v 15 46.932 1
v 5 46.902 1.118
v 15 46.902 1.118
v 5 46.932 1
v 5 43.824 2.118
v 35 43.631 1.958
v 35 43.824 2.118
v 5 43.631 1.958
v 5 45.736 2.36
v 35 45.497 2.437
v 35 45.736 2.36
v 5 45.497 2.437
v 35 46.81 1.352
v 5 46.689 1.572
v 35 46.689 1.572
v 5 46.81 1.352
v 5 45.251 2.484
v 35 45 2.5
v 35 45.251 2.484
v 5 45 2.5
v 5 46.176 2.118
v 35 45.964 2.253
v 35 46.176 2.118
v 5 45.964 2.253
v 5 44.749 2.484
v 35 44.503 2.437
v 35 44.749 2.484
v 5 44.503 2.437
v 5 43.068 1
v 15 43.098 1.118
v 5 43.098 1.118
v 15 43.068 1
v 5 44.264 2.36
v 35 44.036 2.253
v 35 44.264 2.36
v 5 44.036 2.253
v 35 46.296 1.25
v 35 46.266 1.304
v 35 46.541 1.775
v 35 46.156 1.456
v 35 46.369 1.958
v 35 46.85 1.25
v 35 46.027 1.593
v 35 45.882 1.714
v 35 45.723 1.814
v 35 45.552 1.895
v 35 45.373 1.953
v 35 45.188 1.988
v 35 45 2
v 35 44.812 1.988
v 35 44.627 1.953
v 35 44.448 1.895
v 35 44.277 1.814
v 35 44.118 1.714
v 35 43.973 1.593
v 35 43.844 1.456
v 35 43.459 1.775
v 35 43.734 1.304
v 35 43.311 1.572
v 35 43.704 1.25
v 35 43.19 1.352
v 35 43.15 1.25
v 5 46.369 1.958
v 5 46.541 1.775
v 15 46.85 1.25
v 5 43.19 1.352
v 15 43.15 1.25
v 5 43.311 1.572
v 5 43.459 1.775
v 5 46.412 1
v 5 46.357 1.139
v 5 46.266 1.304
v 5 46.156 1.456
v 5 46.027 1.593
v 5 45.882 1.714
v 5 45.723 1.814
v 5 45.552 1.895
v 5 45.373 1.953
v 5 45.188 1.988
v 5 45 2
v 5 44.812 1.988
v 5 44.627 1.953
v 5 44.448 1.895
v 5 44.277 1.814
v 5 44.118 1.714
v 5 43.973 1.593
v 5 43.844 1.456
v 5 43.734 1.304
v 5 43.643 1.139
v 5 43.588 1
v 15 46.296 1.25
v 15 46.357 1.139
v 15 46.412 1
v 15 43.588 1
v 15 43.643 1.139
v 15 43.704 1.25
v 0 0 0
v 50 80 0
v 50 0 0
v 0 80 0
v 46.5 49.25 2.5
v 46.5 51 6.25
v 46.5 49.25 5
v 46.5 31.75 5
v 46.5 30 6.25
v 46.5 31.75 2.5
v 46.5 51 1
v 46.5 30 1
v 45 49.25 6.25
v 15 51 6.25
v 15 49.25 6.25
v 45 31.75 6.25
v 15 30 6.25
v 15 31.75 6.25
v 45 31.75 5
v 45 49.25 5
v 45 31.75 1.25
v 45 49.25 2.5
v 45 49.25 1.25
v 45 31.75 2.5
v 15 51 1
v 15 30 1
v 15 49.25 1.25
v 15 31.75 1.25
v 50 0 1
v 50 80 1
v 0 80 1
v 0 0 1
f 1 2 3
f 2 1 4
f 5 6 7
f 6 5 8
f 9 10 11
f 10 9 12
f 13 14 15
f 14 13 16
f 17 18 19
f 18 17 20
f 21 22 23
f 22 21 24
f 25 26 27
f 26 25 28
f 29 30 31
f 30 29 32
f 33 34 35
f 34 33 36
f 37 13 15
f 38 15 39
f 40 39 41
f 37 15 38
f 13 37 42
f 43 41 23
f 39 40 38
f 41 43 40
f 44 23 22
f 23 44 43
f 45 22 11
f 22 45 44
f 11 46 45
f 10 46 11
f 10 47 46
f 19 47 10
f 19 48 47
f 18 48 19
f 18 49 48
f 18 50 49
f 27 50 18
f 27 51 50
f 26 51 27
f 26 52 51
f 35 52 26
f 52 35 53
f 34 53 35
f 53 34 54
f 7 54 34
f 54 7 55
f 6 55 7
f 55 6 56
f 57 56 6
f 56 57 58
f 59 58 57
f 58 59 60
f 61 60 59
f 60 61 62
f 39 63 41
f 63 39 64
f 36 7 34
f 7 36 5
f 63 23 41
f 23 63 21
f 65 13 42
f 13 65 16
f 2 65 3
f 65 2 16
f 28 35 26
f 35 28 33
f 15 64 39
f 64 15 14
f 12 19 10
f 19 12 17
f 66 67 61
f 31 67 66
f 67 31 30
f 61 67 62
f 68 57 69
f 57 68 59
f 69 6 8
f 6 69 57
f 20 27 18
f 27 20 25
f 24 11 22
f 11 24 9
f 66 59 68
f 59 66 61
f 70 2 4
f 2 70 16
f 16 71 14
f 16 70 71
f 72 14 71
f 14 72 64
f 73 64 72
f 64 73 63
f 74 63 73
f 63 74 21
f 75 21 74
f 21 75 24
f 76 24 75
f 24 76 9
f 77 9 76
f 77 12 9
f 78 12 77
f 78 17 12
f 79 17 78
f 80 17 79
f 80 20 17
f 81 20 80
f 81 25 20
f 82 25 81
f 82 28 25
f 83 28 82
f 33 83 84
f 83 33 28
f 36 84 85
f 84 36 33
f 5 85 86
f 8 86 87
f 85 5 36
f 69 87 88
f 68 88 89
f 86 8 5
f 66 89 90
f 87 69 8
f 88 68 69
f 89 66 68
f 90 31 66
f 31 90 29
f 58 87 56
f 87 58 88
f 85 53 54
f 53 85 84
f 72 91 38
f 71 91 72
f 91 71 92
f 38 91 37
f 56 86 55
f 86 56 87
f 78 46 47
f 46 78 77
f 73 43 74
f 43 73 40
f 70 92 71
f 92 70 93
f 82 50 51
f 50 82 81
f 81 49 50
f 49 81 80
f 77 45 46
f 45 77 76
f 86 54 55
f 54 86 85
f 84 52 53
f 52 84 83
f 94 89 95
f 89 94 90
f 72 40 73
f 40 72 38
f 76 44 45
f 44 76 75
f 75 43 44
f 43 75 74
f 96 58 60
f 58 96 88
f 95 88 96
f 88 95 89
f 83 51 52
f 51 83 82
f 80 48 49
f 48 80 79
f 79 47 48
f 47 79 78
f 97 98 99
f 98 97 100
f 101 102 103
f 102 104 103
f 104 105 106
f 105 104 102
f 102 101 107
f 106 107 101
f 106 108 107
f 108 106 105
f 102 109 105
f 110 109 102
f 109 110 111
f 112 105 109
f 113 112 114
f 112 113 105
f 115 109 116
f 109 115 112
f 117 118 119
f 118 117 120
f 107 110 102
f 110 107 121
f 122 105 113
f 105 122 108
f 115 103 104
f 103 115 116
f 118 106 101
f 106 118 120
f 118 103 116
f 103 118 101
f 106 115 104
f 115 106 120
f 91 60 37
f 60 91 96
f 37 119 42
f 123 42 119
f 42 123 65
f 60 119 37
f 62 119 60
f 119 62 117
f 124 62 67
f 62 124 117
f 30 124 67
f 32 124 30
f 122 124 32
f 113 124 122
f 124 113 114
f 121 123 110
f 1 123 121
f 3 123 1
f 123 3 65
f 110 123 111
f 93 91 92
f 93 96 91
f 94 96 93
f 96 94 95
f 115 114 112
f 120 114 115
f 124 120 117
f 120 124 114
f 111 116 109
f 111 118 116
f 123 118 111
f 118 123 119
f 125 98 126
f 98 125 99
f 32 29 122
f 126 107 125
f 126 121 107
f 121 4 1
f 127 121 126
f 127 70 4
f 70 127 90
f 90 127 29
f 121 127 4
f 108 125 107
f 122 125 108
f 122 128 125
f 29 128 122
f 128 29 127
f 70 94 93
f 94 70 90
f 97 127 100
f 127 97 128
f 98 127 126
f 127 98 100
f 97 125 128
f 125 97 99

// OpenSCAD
module outer_box(){
 	cube([10, 6, 0.5]);
 
	//right wall
 	translate([0, 0, .5])
 		cube([10, 0.5, 2]);
 	//left wall
 	translate([0, 5.5, .5])
 		cube([10, 0.5, 2]);

	//bottom wall
	difference(){
		translate([10, 0, 0])
			cube([.5, 6, 2.5]);
		translate([9.5, .5, 1])
			cube([2, 5, 1]);
	}
 }
 
module inner_slide(){
 	//color("blue")
 		translate([1, 1.1, 1.2]){
 			cube([11, 3.8, 0.7]);
 			cube([1, 3.8, .7]);
			translate([10, 0, -.2]) cube([1, 3.8, 1.2]);
 	}
 }
 
module pulley(){
	outer_box();
	translate([0, 0, 0])
		% inner_slide();
}
module  straw(){
	difference(){
		difference(){
			cylinder($fn=50, h=30, r=2, center=true);
			cylinder($fn=50, h=40, r=1.5, center=true);
		}
	
		translate([.5, -3, -15])	cube([6, 6, 40]);
	}
}

translate([20, 45, .5]) rotate([0, 90, 0])
straw();

translate([15, 30, 0]) scale([3, 3.5, 2.5])
	pulley();

//base
difference(){
	cube([50, 80, 1]);
	translate([22, 31, 3]) cube([30, 16, 4]);
}
